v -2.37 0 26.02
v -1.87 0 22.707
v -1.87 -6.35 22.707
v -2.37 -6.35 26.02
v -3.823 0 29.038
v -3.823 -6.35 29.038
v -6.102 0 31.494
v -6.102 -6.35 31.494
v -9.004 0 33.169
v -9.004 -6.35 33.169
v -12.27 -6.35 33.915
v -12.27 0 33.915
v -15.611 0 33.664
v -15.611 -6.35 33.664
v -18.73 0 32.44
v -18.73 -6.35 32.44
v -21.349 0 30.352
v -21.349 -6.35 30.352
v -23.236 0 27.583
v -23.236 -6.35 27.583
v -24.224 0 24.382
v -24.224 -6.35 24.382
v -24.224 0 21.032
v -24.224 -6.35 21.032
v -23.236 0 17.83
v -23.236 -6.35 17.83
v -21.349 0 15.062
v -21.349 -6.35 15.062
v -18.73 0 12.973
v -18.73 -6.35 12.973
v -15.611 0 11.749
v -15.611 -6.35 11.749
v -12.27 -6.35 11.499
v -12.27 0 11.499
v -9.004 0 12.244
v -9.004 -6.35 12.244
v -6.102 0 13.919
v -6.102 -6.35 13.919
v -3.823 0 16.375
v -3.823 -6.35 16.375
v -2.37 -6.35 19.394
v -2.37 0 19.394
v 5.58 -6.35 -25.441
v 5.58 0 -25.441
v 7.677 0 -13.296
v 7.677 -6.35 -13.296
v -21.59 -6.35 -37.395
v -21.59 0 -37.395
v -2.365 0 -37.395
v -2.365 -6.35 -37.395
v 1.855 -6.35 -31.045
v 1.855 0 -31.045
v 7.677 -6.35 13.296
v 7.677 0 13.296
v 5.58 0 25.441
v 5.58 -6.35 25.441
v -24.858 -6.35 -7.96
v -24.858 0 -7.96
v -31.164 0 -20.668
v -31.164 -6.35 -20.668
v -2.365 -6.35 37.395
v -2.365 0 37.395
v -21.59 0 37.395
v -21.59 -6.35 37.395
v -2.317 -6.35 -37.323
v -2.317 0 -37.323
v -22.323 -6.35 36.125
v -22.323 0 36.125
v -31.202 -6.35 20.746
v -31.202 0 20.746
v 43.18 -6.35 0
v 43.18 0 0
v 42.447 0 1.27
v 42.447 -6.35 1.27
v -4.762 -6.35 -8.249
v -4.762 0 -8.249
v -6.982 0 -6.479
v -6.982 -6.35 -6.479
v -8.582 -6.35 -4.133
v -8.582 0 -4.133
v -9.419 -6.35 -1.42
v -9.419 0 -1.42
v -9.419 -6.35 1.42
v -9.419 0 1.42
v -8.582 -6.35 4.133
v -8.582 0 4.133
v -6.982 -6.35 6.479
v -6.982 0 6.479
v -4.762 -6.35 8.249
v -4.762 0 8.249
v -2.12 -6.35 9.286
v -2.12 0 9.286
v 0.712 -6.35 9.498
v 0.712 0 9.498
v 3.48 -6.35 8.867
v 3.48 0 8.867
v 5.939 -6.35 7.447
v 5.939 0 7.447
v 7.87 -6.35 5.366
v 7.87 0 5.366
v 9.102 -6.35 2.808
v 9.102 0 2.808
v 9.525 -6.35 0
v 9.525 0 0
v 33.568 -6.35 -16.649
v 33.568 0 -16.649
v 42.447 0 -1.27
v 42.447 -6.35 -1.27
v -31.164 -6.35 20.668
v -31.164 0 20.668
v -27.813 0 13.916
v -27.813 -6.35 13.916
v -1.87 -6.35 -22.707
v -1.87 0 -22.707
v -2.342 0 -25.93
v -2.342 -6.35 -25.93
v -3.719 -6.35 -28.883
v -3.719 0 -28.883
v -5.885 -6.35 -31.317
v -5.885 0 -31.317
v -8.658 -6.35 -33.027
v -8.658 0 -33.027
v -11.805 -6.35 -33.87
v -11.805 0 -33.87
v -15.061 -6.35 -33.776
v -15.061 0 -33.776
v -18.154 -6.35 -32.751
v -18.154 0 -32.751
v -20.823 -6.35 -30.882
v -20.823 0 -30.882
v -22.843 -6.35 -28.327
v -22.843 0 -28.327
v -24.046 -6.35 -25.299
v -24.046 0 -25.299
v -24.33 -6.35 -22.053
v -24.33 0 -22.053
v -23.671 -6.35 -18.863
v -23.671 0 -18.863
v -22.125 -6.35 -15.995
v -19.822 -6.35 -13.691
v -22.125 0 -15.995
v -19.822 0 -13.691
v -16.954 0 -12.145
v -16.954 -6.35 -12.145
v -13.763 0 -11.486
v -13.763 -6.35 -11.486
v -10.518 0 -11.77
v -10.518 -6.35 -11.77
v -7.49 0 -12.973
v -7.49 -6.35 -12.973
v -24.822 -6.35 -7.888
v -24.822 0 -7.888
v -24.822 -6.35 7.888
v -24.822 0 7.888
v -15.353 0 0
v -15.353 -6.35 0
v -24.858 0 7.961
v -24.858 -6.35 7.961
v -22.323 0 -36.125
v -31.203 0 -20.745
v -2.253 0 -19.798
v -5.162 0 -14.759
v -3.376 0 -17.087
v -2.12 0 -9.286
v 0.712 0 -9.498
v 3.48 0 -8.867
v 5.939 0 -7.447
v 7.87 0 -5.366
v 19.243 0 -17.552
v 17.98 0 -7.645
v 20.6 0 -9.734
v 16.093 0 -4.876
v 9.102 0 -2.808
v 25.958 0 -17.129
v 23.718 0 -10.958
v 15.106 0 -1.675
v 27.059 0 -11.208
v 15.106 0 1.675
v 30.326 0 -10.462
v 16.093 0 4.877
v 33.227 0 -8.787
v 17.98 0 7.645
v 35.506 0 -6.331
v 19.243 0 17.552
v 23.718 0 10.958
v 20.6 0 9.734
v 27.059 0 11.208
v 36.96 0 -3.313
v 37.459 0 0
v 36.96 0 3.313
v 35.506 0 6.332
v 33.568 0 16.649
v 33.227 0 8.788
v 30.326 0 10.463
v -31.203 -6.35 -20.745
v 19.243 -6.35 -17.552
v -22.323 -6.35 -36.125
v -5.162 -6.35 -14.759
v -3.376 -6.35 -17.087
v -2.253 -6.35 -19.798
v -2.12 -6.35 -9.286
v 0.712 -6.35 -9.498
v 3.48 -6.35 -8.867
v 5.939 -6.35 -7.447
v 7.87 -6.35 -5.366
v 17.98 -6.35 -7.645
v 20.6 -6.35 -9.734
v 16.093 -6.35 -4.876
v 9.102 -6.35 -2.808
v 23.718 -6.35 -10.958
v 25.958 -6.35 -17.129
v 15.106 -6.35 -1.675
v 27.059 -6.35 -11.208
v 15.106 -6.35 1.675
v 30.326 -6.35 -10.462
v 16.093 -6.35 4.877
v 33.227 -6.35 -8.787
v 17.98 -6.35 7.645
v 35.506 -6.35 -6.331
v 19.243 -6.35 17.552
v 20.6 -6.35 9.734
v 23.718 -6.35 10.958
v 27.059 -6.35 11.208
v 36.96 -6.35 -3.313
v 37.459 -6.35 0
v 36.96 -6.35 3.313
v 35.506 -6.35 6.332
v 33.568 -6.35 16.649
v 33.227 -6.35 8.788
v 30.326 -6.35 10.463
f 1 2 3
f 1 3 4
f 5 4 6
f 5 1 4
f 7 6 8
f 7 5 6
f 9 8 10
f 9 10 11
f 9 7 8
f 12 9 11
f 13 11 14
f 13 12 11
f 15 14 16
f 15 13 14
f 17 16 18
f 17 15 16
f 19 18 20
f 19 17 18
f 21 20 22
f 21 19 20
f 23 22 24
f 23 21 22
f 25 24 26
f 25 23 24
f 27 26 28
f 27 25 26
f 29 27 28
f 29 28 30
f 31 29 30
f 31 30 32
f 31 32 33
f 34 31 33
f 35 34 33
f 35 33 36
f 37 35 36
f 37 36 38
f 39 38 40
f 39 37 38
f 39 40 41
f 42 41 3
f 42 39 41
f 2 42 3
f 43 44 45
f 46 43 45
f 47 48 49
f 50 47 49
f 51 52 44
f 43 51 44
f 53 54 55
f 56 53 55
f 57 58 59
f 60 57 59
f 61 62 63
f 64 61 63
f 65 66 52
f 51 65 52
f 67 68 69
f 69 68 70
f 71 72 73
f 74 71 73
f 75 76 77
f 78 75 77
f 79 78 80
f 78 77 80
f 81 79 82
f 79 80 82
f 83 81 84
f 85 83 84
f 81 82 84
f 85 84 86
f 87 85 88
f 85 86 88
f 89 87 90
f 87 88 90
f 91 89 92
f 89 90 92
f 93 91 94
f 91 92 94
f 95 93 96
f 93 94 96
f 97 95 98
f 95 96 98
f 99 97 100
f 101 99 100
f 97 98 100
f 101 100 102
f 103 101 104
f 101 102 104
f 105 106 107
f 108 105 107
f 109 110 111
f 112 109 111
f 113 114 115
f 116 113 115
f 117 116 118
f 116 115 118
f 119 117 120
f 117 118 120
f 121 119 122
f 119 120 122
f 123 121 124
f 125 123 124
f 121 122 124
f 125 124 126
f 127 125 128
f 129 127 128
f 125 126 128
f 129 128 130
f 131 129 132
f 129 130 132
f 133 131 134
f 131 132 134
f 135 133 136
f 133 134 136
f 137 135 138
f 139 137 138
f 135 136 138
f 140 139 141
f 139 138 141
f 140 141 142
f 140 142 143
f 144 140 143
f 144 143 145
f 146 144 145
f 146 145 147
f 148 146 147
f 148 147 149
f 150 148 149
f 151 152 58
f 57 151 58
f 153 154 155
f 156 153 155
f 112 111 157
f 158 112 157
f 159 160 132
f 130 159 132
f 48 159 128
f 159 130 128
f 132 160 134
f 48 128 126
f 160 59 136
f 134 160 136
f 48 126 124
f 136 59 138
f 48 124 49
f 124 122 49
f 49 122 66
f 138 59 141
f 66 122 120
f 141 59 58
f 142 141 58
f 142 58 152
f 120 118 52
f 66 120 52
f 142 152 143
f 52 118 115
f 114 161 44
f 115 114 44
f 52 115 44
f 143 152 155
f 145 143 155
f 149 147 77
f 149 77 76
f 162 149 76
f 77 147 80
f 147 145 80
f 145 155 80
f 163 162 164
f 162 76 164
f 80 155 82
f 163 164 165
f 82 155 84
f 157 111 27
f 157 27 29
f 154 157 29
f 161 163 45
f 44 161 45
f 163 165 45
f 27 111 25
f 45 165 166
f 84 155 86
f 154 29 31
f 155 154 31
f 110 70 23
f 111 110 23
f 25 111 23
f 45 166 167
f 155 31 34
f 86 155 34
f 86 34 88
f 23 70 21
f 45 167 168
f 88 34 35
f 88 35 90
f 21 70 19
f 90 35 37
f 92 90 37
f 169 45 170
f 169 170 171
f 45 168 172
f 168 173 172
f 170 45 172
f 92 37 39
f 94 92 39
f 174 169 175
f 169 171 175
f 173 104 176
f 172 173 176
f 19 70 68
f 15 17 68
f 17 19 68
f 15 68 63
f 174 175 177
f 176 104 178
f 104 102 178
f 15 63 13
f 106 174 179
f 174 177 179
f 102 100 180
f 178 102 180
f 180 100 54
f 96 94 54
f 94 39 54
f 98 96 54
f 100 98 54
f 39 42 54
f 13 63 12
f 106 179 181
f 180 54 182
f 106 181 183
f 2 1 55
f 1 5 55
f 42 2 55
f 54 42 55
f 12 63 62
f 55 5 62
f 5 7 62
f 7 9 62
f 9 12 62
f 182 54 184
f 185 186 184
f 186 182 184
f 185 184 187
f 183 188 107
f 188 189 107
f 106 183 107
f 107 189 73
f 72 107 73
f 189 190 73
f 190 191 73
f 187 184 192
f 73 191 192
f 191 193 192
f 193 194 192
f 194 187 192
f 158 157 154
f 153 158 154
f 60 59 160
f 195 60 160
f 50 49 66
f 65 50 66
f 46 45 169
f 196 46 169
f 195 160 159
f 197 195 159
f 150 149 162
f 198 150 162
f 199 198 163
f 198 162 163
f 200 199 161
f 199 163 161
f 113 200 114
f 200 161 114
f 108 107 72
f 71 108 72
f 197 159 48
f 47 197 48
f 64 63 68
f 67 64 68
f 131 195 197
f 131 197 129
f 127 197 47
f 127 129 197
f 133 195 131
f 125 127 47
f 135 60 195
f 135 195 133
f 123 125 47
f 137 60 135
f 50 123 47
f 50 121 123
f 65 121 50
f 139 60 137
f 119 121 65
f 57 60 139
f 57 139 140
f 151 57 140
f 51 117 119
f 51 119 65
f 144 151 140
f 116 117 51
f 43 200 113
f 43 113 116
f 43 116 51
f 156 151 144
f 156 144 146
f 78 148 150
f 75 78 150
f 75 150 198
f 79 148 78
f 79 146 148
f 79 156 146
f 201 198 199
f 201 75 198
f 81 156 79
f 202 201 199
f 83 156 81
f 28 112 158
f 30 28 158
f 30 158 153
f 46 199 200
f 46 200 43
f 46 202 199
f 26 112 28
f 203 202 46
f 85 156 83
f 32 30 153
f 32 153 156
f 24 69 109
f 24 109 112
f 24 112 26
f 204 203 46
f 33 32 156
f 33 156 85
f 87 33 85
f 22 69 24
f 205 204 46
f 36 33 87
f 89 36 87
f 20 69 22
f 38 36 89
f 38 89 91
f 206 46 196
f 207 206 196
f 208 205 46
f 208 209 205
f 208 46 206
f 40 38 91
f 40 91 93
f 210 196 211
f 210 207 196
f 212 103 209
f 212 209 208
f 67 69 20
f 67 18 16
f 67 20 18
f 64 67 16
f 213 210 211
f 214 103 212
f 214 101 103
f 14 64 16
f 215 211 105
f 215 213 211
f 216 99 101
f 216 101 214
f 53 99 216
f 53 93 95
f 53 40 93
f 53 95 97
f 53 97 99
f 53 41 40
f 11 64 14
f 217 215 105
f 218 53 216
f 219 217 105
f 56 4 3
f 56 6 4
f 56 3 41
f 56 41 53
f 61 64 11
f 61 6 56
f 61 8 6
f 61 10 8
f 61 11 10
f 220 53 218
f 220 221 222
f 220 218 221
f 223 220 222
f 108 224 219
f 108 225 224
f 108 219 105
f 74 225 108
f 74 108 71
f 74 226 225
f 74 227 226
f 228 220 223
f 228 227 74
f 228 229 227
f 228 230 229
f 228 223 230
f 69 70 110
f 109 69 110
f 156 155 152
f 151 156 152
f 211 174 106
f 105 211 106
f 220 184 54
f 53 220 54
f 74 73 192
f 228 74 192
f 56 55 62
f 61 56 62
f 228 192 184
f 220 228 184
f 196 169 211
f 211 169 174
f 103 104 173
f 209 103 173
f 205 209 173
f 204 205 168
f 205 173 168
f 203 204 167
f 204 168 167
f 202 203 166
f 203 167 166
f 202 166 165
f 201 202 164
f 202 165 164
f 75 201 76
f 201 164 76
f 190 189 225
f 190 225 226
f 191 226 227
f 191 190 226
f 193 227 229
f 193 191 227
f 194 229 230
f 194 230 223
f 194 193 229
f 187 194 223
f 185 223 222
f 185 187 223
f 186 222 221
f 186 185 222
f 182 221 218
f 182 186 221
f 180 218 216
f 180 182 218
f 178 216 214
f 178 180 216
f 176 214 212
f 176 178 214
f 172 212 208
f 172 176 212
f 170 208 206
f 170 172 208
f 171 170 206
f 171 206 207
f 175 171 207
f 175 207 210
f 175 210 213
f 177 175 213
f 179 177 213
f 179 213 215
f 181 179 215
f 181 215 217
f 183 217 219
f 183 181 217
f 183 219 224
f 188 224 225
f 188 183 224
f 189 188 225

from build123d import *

# Parameters (mm, degrees)
F0_R     = 11.2395
F1_DEPTH = 6.35


# Not quite as in the source:
# - ends of sketch curves that miss each other by under 0.0002 mm in the source are joined


with BuildPart() as f1:
    # F0 (on Front) → F1 (new body)
    with BuildSketch(Plane.XZ):
        with BuildLine():
            Line((42.4467651581, 1.27), (33.5675281941, 16.6492895541))
            Line((33.5675281941, 16.6492895541), (19.2425445444, 17.5521669359))
            Line((19.2425445444, 17.5521669359), (7.6766035347, 13.2964561731))
            Line((7.6766035347, 13.2964561731), (5.579663063, 25.4405181745))
            Line((5.579663063, 25.4405181745), (-2.3645964913, 37.3949769354))
            Line((-2.3645964913, 37.3949769354), (-20.1235303163, 37.3949769354))
            ThreePointArc((-20.1235303163, 37.3949769354), (-21.3935303163, 37.054681461), (-22.3232348419, 36.1249769354))
            Line((-22.3232348419, 36.1249769354), (-31.2024718059, 20.7456873813))
            Line((-31.2024718059, 20.7456873813), (-31.1641125036, 20.668391129))
            Line((-31.1641125036, 20.668391129), (-27.8130050023, 13.9157122299))
            Line((-27.8130050023, 13.9157122299), (-24.8577417731, 7.960682843))
            Line((-24.8577417731, 7.960682843), (-24.8218947301, 7.8884489409))
            Line((-24.8218947301, 7.8884489409), (-15.353319828, -3.34766e-05))
            Line((-15.353319828, -3.34766e-05), (-24.8219665561, -7.8881291301))
            Line((-24.8219665561, -7.8881291301), (-24.8578663434, -7.9604670809))
            Line((-24.8578663434, -7.9604670809), (-31.1643564099, -20.6680233587))
            Line((-31.1643564099, -20.6680233587), (-31.2027017544, -20.7452890988))
            Line((-31.2027017544, -20.7452890988), (-22.3232348418, -36.1249769356))
            ThreePointArc((-22.3232348418, -36.1249769356), (-21.9195815404, -36.6510281597), (-21.3935303163, -37.0546814611))
            ThreePointArc((-21.3935303163, -37.0546814611), (-20.7809306909, -37.3084285342), (-20.1235303165, -37.3949769354))
            Line((-20.1235303165, -37.3949769354), (-2.3645964913, -37.3949769354))
            Line((-2.3645964913, -37.3949769354), (-2.3168550697, -37.3231360229))
            Line((-2.3168550697, -37.3231360229), (1.8552556307, -31.0449769354))
            Line((1.8552556307, -31.0449769354), (5.579663063, -25.4405181745))
            Line((5.579663063, -25.4405181745), (7.6765207659, -13.2964418818))
            Line((7.6765207659, -13.2964418818), (19.2425445444, -17.5521669359))
            Line((19.2425445444, -17.5521669359), (25.957862804, -17.1289127727))
            Line((25.957862804, -17.1289127727), (33.5675281941, -16.6492895541))
            Line((33.5675281941, -16.6492895541), (42.4467651581, -1.27))
            ThreePointArc((42.4467651581, -1.27), (42.7870606325, 0), (42.4467651581, 1.27))
        make_face()
        with BuildLine():
            ThreePointArc((-1.8702560234, -22.7067635073), (-22.8434485492, -28.3265135073), (-7.4900060234, -12.9730709815))
            ThreePointArc((-7.4900060234, -12.9730709815), (-3.3760634975, -17.0870135073), (-1.8702560234, -22.7067635073))
        make_face(mode=Mode.SUBTRACT)
        with BuildLine():
            ThreePointArc((-4.7625, -8.248891971), (-4.7625, 8.248891971), (9.525, 0))
            ThreePointArc((9.525, 0), (4.7625, -8.248891971), (-4.7625, -8.248891971))
        make_face(mode=Mode.SUBTRACT)
        with Locations((-13.1097560234, 22.7067635073)):
            Circle(F0_R, mode=Mode.SUBTRACT)
        with Locations((26.2195120463, 0.0001612286)):
            Circle(F0_R, mode=Mode.SUBTRACT)
        with BuildLine():
            Line((43.18, 0), (42.4467651581, 1.27))
            ThreePointArc((42.4467651581, 1.27), (42.7870606325, 0), (42.4467651581, -1.27))
            Line((42.4467651581, -1.27), (43.18, 0))
        make_face()
        with BuildLine():
            ThreePointArc((-22.3232348419, 36.1249769354), (-21.3935303163, 37.054681461), (-20.1235303163, 37.3949769354))
            Line((-20.1235303163, 37.3949769354), (-21.59, 37.3949769354))
            Line((-21.59, 37.3949769354), (-22.3232348419, 36.1249769354))
        make_face()
        with BuildLine():
            Line((-21.59, -37.3949769354), (-20.1235303165, -37.3949769354))
            ThreePointArc((-20.1235303165, -37.3949769354), (-20.7809306909, -37.3084285342), (-21.3935303163, -37.0546814611))
            Line((-21.3935303163, -37.0546814611), (-21.59, -37.3949769354))
        make_face()
        with BuildLine():
            Line((-21.59, -37.3949769354), (-21.3935303163, -37.0546814611))
            ThreePointArc((-21.3935303163, -37.0546814611), (-21.9195815404, -36.6510281597), (-22.3232348418, -36.1249769356))
            Line((-22.3232348418, -36.1249769356), (-21.59, -37.3949769354))
        make_face()
    extrude(amount=F1_DEPTH)


solid = f1.part
